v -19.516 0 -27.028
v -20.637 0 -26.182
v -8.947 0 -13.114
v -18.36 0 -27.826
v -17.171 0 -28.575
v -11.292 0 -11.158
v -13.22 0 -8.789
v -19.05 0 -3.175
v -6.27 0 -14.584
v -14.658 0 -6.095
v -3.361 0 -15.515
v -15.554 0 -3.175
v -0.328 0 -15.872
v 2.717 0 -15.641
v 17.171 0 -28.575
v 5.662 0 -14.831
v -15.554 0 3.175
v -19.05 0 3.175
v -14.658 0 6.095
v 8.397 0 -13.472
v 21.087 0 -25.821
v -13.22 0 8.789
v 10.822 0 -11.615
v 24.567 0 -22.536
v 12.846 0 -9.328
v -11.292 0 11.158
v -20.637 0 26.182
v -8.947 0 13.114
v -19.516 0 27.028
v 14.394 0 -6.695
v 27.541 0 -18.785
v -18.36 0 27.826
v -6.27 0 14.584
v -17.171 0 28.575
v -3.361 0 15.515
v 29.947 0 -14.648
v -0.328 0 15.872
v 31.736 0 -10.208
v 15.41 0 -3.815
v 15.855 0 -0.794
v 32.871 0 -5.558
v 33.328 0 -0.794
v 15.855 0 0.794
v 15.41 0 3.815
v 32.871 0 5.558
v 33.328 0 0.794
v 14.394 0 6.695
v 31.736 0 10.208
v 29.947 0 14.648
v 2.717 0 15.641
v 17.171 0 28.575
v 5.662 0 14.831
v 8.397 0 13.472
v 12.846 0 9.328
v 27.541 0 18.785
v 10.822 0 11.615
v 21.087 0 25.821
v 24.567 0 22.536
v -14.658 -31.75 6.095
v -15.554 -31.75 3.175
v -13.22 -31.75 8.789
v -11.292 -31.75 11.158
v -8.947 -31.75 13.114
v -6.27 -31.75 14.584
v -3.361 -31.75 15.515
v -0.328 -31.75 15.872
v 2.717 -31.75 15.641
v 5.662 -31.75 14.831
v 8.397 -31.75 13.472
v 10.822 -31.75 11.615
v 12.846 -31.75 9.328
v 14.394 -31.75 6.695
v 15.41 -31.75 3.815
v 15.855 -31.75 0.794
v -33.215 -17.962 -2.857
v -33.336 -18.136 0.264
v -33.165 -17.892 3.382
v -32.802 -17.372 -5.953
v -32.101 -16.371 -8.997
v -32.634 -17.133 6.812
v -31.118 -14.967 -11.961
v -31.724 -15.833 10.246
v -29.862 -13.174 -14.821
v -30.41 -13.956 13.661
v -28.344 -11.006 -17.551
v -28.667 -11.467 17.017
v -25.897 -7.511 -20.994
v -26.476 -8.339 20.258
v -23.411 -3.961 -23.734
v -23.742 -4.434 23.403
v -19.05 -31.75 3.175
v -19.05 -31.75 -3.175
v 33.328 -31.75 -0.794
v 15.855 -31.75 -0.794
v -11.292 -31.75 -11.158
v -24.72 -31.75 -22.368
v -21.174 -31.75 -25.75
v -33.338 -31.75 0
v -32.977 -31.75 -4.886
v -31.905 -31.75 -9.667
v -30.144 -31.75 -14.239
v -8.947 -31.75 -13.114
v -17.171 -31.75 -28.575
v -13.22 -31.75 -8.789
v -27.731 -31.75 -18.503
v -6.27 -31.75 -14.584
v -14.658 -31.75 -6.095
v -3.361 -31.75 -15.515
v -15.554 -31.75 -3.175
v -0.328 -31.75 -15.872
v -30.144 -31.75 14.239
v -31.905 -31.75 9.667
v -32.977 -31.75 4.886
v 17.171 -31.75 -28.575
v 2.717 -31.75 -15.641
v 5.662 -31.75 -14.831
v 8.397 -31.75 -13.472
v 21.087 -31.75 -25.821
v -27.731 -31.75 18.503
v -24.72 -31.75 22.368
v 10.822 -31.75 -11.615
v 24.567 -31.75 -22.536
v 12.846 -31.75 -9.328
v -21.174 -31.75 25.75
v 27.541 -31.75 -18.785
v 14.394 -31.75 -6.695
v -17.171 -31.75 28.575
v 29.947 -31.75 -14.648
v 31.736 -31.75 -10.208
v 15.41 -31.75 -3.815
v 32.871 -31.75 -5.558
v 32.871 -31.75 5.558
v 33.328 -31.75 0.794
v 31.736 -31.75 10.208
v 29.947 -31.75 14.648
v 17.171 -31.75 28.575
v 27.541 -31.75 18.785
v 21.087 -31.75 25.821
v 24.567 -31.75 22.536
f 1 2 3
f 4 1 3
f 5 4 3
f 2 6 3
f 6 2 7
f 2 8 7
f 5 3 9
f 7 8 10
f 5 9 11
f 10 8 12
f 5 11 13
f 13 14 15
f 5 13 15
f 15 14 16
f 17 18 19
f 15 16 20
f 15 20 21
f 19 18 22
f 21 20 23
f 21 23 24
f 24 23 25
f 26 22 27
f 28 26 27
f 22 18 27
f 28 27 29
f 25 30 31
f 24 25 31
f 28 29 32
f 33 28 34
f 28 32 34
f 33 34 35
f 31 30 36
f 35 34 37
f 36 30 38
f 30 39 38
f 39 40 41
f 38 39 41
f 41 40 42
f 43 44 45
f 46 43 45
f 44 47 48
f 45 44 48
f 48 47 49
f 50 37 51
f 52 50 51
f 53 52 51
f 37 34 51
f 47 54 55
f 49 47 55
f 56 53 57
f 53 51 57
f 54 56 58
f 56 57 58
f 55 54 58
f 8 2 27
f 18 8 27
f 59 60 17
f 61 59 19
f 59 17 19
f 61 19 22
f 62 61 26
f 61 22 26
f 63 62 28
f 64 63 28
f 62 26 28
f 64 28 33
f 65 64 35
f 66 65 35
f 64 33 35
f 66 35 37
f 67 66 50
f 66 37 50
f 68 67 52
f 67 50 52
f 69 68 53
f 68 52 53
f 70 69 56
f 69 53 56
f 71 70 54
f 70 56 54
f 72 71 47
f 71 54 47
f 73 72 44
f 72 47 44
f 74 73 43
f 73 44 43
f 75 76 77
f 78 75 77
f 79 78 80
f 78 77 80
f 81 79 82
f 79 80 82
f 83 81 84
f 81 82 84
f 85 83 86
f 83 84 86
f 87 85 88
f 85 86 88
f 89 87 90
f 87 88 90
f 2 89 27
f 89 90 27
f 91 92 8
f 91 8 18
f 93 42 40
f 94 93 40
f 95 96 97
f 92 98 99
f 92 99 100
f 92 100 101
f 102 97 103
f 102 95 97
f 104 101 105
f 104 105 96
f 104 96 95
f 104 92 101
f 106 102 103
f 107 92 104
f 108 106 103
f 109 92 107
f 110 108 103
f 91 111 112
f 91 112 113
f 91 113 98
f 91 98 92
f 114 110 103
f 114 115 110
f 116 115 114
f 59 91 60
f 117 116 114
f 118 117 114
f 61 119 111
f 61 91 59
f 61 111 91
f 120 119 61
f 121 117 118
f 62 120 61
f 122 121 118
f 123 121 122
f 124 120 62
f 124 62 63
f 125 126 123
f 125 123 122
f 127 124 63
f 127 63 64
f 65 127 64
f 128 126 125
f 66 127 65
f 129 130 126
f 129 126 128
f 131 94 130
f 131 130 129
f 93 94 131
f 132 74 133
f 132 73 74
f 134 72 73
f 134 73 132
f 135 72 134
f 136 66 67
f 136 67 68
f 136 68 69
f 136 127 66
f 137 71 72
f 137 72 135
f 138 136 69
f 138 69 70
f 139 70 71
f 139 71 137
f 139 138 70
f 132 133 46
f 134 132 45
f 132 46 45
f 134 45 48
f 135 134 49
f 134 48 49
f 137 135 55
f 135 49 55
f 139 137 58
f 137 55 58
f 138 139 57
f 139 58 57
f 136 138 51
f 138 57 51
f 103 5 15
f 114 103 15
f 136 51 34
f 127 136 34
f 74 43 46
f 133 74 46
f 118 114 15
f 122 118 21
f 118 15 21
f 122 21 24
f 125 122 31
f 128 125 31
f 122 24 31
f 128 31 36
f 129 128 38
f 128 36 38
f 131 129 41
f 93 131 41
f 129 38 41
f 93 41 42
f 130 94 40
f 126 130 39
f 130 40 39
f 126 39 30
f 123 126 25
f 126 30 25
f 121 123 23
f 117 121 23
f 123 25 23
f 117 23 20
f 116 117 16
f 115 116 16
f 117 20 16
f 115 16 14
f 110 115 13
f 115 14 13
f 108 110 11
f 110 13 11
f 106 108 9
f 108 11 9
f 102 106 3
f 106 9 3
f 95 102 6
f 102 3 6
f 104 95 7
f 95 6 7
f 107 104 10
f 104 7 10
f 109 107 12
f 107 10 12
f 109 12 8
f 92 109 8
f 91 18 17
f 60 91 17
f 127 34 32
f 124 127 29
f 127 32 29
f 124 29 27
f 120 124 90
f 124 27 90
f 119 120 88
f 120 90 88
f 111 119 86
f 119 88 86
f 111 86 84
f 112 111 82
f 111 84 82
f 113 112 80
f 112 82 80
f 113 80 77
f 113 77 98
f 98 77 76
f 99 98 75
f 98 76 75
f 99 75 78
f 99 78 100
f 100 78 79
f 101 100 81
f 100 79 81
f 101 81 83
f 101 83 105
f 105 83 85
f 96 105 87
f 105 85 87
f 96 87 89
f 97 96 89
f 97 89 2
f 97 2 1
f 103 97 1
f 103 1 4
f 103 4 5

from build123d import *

# Parameters (mm, degrees)
F1_DEPTH = 31.75
F3_DEPTH = 28.575


with BuildPart() as f1:
    # F0 (on Front) → F1 (new body)
    with BuildSketch(Plane.XZ):
        with BuildLine():
            Line((15.855144, 0.79375), (33.328049, 0.79375))
            ThreePointArc((33.328049, 0.79375), (28.81838, 16.75977), (17.171438, 28.575))
            Line((17.171438, 28.575), (-17.171438, 28.575))
            ThreePointArc((-17.171438, 28.575), (-33.3375, 0), (-17.171438, -28.575))
            Line((-17.171438, -28.575), (17.171438, -28.575))
            ThreePointArc((17.171438, -28.575), (28.81838, -16.75977), (33.328049, -0.79375))
            Line((33.328049, -0.79375), (15.855144, -0.79375))
            ThreePointArc((15.855144, -0.79375), (1.200092, -15.829574), (-15.55426, -3.175))
            Line((-15.55426, -3.175), (-19.05, -3.175))
            Line((-19.05, -3.175), (-19.05, 3.175))
            Line((-19.05, 3.175), (-15.55426, 3.175))
            ThreePointArc((-15.55426, 3.175), (1.200092, 15.829574), (15.855144, 0.79375))
        make_face()
    extrude(amount=F1_DEPTH)

    # F2 (on Top) → F3 (cut, symmetric)
    with BuildSketch(Plane.XY):
        Polygon((-20.6375, 0), (-20.6375, 6.484366), (-46.338774, 6.484366), (-45.356732, -28.783964), (-40.792249, -28.783964), align=None)
    extrude(amount=F3_DEPTH, both=True, mode=Mode.SUBTRACT)


solid = f1.part
